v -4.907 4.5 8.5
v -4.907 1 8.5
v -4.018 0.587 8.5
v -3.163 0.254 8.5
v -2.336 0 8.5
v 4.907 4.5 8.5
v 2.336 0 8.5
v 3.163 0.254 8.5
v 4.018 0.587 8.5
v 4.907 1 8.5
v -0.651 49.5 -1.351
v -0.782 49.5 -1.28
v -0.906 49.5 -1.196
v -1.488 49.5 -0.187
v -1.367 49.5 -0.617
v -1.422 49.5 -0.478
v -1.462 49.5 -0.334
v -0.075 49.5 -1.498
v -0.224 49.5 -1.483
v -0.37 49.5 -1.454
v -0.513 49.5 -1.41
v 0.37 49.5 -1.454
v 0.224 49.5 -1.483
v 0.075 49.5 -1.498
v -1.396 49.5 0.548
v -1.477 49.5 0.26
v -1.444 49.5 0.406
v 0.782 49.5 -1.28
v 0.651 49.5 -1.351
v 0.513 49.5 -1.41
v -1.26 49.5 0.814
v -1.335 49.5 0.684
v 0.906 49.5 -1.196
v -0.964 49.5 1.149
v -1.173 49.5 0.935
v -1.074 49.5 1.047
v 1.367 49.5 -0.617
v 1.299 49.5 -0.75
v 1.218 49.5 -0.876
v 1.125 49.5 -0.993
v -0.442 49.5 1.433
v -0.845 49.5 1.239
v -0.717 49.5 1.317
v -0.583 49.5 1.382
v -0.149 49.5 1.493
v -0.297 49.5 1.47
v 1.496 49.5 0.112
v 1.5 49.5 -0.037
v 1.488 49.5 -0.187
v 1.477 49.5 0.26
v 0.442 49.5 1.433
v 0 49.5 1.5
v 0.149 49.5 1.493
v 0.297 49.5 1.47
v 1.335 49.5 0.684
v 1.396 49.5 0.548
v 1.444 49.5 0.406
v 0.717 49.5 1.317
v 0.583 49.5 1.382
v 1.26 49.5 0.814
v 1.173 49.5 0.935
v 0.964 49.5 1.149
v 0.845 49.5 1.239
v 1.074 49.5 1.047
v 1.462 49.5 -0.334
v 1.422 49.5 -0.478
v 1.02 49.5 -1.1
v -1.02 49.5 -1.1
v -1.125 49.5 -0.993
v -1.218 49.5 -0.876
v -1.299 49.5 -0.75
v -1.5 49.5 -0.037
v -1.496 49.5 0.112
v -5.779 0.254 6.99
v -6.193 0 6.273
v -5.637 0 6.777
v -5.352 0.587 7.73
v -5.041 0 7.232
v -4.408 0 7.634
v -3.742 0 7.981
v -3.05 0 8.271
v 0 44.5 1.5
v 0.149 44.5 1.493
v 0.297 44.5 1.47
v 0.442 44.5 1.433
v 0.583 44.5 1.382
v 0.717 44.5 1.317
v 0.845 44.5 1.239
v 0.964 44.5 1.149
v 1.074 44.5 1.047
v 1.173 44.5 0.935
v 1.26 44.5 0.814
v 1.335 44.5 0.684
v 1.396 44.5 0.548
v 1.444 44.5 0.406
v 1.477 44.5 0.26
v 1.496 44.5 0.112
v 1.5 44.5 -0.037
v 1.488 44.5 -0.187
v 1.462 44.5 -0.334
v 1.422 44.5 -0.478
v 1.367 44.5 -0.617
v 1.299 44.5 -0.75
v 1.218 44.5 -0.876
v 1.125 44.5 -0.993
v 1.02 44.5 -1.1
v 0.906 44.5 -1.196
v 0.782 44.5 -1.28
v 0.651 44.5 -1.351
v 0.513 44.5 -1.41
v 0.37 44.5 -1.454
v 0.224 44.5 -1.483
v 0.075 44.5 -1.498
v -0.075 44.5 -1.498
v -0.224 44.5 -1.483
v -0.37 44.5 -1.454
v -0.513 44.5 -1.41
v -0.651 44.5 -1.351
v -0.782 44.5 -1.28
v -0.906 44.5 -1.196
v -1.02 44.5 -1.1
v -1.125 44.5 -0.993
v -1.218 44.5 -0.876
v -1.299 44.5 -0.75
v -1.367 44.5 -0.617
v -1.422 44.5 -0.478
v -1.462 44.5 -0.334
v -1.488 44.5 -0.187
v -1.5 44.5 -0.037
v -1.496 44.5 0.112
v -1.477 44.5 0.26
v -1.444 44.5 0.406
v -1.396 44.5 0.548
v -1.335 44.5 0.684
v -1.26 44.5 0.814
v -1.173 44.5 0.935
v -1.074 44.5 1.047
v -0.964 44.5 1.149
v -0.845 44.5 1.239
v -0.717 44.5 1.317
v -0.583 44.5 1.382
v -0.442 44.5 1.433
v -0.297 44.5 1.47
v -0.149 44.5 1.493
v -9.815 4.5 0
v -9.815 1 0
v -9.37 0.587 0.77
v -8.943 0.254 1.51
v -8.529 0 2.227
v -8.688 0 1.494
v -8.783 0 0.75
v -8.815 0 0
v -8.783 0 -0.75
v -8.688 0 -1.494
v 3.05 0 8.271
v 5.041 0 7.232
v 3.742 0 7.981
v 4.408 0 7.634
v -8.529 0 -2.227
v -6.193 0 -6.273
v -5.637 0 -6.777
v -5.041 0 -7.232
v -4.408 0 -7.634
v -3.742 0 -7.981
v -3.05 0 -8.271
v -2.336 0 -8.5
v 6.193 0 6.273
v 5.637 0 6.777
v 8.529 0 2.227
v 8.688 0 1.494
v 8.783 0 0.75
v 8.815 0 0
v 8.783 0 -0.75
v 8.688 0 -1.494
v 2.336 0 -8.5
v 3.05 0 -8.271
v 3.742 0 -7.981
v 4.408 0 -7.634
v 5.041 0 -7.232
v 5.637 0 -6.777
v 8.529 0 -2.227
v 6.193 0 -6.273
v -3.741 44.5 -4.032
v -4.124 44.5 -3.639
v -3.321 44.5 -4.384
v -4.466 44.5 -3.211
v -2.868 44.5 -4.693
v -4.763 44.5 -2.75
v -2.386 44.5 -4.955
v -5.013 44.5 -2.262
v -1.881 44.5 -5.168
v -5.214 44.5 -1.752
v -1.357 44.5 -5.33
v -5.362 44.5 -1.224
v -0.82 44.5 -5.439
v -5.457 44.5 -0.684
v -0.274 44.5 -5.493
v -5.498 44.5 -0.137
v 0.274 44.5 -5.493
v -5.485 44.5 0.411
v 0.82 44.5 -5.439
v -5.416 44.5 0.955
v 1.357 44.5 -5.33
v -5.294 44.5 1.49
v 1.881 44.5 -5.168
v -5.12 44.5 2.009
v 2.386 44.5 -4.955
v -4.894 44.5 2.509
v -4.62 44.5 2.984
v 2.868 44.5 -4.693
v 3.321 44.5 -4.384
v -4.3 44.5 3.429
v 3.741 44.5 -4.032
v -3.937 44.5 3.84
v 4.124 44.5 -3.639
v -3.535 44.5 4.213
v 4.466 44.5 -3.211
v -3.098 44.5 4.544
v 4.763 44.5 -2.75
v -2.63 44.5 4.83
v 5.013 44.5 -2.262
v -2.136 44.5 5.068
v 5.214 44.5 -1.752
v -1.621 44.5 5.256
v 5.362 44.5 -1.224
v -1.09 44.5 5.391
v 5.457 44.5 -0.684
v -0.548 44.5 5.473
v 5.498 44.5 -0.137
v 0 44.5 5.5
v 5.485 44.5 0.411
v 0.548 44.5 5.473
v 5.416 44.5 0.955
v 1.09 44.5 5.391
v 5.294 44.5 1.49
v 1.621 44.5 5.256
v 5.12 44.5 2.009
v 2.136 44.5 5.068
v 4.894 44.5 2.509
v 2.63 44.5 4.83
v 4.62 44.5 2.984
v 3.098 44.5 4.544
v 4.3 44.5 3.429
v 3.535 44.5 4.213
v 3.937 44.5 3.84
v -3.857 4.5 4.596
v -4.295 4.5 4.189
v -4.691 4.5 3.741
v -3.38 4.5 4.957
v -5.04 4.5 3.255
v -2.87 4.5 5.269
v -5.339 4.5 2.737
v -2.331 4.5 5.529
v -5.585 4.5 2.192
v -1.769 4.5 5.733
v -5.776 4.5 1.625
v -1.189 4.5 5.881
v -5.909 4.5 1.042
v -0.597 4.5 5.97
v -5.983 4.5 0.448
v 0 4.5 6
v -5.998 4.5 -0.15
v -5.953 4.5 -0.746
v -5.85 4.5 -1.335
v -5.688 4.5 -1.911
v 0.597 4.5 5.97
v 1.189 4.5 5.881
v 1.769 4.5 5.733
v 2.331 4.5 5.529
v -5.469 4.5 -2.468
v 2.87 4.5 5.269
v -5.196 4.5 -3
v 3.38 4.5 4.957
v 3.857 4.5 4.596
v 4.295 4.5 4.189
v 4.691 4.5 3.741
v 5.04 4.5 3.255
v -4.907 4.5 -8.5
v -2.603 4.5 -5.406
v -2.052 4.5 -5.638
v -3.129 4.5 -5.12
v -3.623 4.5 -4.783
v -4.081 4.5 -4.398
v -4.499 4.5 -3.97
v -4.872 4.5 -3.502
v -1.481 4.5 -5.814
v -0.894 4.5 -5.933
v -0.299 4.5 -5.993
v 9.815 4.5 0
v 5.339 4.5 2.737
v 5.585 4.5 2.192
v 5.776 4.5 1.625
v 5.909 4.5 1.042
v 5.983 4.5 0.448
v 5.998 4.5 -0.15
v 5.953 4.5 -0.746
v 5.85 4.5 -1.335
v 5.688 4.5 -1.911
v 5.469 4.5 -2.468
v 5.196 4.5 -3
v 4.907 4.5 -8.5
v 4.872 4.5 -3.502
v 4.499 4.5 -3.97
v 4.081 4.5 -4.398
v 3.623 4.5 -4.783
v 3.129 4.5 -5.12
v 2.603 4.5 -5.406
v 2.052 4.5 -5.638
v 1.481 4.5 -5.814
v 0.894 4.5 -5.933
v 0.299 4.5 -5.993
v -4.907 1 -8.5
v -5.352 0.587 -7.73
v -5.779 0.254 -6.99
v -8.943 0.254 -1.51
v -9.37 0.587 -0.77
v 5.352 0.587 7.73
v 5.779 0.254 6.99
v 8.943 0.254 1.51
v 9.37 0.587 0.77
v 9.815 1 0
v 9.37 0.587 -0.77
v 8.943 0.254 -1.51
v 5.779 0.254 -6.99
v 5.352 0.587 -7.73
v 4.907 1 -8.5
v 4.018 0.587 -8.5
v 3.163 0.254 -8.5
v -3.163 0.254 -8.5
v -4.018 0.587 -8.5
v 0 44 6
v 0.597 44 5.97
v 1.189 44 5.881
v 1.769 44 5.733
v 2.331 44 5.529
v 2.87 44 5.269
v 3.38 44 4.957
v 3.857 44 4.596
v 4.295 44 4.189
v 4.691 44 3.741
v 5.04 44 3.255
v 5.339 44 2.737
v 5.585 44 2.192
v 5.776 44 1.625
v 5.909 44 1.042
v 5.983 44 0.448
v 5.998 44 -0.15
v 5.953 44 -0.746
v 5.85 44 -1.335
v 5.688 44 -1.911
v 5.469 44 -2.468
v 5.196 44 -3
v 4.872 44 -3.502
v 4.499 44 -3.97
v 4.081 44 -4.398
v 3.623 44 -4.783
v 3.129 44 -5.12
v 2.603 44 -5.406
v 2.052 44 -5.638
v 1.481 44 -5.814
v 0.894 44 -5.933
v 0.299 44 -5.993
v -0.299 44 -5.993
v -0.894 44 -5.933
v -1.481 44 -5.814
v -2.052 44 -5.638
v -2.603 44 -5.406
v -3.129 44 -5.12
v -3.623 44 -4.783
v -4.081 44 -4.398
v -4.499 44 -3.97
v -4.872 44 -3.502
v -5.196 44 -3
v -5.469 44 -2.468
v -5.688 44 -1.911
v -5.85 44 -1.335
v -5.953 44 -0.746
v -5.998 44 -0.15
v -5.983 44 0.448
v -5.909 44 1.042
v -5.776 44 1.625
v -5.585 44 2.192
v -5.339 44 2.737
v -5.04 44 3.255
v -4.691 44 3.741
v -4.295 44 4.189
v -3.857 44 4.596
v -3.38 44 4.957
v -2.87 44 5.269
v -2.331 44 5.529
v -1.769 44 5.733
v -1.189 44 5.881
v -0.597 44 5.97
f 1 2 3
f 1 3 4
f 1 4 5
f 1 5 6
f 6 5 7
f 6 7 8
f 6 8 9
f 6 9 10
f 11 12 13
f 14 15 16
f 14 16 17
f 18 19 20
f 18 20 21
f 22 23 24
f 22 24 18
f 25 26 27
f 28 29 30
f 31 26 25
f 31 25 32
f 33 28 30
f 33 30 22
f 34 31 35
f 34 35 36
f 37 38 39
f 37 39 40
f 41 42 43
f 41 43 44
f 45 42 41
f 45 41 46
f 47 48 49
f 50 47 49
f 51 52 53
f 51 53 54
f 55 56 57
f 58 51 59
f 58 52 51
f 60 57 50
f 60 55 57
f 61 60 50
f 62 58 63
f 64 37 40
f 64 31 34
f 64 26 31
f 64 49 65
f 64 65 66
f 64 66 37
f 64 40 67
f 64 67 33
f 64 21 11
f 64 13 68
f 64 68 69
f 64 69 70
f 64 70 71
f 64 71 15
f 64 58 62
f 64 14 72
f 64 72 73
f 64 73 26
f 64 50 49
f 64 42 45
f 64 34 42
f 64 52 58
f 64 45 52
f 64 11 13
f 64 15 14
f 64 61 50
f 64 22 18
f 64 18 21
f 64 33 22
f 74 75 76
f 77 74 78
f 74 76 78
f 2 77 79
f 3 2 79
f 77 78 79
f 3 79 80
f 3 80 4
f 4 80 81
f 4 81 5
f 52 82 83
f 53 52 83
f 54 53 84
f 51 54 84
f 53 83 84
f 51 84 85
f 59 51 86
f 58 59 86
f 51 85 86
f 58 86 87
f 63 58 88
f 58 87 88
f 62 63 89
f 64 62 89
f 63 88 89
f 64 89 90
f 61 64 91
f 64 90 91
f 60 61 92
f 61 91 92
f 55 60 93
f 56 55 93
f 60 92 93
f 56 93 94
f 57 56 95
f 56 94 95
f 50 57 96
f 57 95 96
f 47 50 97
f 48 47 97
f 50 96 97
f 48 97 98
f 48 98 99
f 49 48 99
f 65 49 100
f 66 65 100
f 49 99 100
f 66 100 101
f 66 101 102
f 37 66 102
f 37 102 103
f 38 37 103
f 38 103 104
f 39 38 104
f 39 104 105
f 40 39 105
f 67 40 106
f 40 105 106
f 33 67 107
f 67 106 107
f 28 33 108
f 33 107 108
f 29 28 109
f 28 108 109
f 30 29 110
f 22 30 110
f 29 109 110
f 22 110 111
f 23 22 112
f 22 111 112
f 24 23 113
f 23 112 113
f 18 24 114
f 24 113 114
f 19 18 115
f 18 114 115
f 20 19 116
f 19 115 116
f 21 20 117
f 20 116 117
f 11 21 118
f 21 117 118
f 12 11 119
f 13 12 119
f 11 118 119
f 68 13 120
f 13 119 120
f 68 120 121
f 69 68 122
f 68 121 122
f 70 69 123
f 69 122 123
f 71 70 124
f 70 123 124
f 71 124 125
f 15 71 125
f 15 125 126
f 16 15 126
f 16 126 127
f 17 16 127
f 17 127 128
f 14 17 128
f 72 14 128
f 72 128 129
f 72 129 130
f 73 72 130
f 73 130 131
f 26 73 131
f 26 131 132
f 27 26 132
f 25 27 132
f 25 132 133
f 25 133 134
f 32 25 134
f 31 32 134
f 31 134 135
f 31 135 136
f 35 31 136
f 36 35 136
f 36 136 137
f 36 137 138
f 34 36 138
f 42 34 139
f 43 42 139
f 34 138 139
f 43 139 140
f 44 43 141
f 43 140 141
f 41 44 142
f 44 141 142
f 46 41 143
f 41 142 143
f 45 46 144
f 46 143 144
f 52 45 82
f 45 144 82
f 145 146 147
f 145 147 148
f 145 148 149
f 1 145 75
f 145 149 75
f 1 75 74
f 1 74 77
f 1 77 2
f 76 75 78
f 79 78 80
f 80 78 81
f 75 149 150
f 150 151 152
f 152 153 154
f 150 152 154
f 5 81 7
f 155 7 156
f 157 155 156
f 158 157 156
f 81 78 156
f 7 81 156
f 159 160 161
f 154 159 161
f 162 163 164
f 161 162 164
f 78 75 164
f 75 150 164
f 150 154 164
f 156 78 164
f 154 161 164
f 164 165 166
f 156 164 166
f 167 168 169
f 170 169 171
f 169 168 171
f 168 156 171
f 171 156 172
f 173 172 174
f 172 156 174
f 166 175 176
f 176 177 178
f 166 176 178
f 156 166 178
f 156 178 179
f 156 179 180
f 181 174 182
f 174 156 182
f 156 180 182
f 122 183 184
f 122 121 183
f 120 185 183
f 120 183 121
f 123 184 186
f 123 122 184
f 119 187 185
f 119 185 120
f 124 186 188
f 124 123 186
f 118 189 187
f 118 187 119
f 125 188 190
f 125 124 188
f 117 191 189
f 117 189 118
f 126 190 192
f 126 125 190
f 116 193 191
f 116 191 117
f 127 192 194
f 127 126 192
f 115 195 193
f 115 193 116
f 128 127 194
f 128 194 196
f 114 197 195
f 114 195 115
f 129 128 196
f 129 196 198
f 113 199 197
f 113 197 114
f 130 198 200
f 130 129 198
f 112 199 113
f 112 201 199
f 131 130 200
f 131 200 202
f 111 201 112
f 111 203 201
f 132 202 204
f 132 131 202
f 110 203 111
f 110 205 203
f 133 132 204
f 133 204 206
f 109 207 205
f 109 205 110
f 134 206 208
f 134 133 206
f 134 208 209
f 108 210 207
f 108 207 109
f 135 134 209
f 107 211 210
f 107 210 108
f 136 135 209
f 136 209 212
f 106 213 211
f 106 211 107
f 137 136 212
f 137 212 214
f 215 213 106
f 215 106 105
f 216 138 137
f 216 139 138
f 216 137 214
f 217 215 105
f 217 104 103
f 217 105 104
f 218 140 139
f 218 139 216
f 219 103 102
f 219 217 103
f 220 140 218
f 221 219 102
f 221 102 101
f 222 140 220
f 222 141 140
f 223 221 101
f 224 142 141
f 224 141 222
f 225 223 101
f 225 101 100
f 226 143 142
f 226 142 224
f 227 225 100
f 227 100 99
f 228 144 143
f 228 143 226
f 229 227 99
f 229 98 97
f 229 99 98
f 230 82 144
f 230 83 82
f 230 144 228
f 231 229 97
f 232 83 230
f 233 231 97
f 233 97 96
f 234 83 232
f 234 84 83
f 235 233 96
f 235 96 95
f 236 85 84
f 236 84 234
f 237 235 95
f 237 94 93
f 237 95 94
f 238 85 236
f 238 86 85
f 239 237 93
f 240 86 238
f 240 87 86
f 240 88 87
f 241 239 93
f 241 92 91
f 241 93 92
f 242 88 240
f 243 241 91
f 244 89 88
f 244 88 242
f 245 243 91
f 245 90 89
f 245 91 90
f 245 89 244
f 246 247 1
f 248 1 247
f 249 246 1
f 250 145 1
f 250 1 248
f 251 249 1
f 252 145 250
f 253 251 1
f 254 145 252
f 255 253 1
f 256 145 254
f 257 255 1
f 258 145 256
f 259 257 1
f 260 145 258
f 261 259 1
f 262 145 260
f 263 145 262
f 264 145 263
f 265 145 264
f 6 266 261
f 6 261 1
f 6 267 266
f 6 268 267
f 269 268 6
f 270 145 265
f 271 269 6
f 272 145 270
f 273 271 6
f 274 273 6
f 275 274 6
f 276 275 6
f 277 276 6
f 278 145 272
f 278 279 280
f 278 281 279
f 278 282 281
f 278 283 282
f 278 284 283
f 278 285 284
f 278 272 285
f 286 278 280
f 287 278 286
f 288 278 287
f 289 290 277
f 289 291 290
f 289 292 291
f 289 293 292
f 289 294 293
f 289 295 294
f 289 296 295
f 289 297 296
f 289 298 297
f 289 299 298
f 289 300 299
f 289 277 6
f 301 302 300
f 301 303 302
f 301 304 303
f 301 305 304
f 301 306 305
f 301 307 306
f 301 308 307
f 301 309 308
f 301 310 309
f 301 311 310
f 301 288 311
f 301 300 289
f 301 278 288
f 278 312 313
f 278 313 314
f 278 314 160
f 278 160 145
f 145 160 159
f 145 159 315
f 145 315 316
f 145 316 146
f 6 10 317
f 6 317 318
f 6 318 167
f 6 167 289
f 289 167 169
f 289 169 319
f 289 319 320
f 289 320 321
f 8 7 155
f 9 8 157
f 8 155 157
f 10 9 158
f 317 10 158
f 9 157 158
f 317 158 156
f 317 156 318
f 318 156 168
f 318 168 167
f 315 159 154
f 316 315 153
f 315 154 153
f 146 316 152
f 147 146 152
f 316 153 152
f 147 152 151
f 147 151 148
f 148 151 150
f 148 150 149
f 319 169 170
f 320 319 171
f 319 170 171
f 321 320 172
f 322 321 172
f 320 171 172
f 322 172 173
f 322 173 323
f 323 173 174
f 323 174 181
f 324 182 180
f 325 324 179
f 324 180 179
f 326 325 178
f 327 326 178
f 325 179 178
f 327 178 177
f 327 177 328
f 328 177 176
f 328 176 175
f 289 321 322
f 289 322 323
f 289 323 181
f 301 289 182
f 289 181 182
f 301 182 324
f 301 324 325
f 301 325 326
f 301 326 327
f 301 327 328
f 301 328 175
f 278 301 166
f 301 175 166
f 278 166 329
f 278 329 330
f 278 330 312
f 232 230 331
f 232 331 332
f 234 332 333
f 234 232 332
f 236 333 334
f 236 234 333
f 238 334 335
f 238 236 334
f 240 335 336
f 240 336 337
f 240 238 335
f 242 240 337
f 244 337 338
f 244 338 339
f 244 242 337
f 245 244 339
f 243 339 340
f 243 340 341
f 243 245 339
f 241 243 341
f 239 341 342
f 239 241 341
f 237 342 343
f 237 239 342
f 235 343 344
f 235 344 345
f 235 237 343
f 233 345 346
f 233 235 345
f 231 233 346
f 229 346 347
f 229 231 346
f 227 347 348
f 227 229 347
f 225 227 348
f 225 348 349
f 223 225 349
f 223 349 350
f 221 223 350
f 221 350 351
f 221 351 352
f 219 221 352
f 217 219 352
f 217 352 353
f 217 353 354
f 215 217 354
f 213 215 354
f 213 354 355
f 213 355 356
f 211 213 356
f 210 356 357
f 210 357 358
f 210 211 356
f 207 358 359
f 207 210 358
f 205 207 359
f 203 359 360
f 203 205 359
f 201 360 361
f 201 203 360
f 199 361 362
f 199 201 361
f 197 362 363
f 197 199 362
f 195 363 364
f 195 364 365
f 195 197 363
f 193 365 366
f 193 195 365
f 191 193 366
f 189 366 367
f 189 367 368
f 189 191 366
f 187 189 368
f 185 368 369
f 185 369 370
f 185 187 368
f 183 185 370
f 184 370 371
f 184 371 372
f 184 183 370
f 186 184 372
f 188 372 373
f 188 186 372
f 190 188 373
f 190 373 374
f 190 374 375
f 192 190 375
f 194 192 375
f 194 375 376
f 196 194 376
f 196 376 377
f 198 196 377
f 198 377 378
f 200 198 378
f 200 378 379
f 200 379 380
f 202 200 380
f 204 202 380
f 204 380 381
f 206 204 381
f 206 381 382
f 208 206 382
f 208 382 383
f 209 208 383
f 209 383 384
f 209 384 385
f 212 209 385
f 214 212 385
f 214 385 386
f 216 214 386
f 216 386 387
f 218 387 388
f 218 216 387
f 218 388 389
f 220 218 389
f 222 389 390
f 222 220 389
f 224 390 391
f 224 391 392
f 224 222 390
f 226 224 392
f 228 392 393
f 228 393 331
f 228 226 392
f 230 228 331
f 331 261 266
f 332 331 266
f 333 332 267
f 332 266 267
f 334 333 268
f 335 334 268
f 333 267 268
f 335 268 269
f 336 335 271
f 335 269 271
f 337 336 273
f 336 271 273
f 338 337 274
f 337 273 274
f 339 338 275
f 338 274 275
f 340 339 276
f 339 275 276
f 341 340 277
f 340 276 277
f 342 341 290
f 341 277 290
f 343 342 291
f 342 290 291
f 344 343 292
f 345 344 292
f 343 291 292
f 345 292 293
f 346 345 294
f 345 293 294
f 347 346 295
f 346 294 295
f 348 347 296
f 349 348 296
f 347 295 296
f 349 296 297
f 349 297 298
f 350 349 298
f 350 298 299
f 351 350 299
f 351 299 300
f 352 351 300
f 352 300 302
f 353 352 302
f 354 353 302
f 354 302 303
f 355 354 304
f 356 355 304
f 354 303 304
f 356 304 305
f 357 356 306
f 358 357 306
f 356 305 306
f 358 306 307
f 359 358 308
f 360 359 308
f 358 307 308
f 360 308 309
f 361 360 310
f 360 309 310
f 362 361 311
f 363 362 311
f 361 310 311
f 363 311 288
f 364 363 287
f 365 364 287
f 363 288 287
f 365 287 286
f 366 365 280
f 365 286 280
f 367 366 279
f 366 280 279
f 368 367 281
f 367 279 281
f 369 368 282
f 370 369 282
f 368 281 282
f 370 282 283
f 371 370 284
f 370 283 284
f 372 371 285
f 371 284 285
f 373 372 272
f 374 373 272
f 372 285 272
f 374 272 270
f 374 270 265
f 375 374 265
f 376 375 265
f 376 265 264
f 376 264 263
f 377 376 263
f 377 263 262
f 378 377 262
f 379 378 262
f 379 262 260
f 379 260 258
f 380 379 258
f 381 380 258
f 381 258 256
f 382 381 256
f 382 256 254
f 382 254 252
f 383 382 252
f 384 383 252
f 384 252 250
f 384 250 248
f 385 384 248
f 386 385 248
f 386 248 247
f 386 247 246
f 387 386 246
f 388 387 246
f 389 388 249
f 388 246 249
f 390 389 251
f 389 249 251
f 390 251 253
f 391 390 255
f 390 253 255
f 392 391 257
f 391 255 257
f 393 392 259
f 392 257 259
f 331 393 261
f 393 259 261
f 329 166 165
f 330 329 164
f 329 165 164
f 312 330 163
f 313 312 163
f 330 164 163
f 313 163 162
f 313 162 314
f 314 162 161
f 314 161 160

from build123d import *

# Parameters (mm, degrees)
P_IDAT_VYSUNUT_M1_DEPTH = 4.5
SKICA2_R                = 6
P_IDAT_VYSUNUT_M2_DEPTH = 40
SKICA3_R                = 1.5
P_IDAT_VYSUNUT_M3_DEPTH = 5
ZKOSEN_1_SIZE           = 0.5


with BuildPart() as part:
    # Skica1 → Přidat vysunutím1 (new body)
    with BuildSketch(Plane(origin=(0, 0, 0), x_dir=(1, 0, 0), z_dir=(0, 1, 0))):
        Polygon((9.814954576, 0), (4.907477288, 8.5), (-4.907477288, 8.5), (-9.814954576, 0), (-4.907477288, -8.5), (4.907477288, -8.5), align=None)
    extrude(amount=P_IDAT_VYSUNUT_M1_DEPTH)

    # Skica2 → Přidat vysunutím2 (add)
    with BuildSketch(Plane(origin=(0, 4.5, 0), x_dir=(1, 0, 0), z_dir=(0, 1, 0))):
        with Locations(Location((0, 0, 0), (0, 0, 270))):
            Circle(SKICA2_R)
    extrude(amount=P_IDAT_VYSUNUT_M2_DEPTH)

    # Skica3 → Přidat vysunutím3 (add)
    with BuildSketch(Plane(origin=(0, 44.5, 0), x_dir=(1, 0, 0), z_dir=(0, 1, 0))):
        with Locations(Location((0, 0, 0), (0, 0, 270))):
            Circle(SKICA3_R)
    extrude(amount=P_IDAT_VYSUNUT_M3_DEPTH)

    # Skica4 → Odebrat rotací1 (revolve, cut)
    with BuildSketch(Plane.XY):
        Polygon((-9.814954576, 0.999848989), (-8.815105588, 0), (-9.814954576, 0), align=None)
    revolve(axis=Axis((0, 0, 0), (0, 1, 0)), mode=Mode.SUBTRACT)

    # Zkosení1
    zkosen_1_edges = [part.edges().sort_by_distance(p)[0] for p in [
        (0, 44.5, -6),
    ]]
    chamfer(zkosen_1_edges, length=ZKOSEN_1_SIZE)


solid = part.part
